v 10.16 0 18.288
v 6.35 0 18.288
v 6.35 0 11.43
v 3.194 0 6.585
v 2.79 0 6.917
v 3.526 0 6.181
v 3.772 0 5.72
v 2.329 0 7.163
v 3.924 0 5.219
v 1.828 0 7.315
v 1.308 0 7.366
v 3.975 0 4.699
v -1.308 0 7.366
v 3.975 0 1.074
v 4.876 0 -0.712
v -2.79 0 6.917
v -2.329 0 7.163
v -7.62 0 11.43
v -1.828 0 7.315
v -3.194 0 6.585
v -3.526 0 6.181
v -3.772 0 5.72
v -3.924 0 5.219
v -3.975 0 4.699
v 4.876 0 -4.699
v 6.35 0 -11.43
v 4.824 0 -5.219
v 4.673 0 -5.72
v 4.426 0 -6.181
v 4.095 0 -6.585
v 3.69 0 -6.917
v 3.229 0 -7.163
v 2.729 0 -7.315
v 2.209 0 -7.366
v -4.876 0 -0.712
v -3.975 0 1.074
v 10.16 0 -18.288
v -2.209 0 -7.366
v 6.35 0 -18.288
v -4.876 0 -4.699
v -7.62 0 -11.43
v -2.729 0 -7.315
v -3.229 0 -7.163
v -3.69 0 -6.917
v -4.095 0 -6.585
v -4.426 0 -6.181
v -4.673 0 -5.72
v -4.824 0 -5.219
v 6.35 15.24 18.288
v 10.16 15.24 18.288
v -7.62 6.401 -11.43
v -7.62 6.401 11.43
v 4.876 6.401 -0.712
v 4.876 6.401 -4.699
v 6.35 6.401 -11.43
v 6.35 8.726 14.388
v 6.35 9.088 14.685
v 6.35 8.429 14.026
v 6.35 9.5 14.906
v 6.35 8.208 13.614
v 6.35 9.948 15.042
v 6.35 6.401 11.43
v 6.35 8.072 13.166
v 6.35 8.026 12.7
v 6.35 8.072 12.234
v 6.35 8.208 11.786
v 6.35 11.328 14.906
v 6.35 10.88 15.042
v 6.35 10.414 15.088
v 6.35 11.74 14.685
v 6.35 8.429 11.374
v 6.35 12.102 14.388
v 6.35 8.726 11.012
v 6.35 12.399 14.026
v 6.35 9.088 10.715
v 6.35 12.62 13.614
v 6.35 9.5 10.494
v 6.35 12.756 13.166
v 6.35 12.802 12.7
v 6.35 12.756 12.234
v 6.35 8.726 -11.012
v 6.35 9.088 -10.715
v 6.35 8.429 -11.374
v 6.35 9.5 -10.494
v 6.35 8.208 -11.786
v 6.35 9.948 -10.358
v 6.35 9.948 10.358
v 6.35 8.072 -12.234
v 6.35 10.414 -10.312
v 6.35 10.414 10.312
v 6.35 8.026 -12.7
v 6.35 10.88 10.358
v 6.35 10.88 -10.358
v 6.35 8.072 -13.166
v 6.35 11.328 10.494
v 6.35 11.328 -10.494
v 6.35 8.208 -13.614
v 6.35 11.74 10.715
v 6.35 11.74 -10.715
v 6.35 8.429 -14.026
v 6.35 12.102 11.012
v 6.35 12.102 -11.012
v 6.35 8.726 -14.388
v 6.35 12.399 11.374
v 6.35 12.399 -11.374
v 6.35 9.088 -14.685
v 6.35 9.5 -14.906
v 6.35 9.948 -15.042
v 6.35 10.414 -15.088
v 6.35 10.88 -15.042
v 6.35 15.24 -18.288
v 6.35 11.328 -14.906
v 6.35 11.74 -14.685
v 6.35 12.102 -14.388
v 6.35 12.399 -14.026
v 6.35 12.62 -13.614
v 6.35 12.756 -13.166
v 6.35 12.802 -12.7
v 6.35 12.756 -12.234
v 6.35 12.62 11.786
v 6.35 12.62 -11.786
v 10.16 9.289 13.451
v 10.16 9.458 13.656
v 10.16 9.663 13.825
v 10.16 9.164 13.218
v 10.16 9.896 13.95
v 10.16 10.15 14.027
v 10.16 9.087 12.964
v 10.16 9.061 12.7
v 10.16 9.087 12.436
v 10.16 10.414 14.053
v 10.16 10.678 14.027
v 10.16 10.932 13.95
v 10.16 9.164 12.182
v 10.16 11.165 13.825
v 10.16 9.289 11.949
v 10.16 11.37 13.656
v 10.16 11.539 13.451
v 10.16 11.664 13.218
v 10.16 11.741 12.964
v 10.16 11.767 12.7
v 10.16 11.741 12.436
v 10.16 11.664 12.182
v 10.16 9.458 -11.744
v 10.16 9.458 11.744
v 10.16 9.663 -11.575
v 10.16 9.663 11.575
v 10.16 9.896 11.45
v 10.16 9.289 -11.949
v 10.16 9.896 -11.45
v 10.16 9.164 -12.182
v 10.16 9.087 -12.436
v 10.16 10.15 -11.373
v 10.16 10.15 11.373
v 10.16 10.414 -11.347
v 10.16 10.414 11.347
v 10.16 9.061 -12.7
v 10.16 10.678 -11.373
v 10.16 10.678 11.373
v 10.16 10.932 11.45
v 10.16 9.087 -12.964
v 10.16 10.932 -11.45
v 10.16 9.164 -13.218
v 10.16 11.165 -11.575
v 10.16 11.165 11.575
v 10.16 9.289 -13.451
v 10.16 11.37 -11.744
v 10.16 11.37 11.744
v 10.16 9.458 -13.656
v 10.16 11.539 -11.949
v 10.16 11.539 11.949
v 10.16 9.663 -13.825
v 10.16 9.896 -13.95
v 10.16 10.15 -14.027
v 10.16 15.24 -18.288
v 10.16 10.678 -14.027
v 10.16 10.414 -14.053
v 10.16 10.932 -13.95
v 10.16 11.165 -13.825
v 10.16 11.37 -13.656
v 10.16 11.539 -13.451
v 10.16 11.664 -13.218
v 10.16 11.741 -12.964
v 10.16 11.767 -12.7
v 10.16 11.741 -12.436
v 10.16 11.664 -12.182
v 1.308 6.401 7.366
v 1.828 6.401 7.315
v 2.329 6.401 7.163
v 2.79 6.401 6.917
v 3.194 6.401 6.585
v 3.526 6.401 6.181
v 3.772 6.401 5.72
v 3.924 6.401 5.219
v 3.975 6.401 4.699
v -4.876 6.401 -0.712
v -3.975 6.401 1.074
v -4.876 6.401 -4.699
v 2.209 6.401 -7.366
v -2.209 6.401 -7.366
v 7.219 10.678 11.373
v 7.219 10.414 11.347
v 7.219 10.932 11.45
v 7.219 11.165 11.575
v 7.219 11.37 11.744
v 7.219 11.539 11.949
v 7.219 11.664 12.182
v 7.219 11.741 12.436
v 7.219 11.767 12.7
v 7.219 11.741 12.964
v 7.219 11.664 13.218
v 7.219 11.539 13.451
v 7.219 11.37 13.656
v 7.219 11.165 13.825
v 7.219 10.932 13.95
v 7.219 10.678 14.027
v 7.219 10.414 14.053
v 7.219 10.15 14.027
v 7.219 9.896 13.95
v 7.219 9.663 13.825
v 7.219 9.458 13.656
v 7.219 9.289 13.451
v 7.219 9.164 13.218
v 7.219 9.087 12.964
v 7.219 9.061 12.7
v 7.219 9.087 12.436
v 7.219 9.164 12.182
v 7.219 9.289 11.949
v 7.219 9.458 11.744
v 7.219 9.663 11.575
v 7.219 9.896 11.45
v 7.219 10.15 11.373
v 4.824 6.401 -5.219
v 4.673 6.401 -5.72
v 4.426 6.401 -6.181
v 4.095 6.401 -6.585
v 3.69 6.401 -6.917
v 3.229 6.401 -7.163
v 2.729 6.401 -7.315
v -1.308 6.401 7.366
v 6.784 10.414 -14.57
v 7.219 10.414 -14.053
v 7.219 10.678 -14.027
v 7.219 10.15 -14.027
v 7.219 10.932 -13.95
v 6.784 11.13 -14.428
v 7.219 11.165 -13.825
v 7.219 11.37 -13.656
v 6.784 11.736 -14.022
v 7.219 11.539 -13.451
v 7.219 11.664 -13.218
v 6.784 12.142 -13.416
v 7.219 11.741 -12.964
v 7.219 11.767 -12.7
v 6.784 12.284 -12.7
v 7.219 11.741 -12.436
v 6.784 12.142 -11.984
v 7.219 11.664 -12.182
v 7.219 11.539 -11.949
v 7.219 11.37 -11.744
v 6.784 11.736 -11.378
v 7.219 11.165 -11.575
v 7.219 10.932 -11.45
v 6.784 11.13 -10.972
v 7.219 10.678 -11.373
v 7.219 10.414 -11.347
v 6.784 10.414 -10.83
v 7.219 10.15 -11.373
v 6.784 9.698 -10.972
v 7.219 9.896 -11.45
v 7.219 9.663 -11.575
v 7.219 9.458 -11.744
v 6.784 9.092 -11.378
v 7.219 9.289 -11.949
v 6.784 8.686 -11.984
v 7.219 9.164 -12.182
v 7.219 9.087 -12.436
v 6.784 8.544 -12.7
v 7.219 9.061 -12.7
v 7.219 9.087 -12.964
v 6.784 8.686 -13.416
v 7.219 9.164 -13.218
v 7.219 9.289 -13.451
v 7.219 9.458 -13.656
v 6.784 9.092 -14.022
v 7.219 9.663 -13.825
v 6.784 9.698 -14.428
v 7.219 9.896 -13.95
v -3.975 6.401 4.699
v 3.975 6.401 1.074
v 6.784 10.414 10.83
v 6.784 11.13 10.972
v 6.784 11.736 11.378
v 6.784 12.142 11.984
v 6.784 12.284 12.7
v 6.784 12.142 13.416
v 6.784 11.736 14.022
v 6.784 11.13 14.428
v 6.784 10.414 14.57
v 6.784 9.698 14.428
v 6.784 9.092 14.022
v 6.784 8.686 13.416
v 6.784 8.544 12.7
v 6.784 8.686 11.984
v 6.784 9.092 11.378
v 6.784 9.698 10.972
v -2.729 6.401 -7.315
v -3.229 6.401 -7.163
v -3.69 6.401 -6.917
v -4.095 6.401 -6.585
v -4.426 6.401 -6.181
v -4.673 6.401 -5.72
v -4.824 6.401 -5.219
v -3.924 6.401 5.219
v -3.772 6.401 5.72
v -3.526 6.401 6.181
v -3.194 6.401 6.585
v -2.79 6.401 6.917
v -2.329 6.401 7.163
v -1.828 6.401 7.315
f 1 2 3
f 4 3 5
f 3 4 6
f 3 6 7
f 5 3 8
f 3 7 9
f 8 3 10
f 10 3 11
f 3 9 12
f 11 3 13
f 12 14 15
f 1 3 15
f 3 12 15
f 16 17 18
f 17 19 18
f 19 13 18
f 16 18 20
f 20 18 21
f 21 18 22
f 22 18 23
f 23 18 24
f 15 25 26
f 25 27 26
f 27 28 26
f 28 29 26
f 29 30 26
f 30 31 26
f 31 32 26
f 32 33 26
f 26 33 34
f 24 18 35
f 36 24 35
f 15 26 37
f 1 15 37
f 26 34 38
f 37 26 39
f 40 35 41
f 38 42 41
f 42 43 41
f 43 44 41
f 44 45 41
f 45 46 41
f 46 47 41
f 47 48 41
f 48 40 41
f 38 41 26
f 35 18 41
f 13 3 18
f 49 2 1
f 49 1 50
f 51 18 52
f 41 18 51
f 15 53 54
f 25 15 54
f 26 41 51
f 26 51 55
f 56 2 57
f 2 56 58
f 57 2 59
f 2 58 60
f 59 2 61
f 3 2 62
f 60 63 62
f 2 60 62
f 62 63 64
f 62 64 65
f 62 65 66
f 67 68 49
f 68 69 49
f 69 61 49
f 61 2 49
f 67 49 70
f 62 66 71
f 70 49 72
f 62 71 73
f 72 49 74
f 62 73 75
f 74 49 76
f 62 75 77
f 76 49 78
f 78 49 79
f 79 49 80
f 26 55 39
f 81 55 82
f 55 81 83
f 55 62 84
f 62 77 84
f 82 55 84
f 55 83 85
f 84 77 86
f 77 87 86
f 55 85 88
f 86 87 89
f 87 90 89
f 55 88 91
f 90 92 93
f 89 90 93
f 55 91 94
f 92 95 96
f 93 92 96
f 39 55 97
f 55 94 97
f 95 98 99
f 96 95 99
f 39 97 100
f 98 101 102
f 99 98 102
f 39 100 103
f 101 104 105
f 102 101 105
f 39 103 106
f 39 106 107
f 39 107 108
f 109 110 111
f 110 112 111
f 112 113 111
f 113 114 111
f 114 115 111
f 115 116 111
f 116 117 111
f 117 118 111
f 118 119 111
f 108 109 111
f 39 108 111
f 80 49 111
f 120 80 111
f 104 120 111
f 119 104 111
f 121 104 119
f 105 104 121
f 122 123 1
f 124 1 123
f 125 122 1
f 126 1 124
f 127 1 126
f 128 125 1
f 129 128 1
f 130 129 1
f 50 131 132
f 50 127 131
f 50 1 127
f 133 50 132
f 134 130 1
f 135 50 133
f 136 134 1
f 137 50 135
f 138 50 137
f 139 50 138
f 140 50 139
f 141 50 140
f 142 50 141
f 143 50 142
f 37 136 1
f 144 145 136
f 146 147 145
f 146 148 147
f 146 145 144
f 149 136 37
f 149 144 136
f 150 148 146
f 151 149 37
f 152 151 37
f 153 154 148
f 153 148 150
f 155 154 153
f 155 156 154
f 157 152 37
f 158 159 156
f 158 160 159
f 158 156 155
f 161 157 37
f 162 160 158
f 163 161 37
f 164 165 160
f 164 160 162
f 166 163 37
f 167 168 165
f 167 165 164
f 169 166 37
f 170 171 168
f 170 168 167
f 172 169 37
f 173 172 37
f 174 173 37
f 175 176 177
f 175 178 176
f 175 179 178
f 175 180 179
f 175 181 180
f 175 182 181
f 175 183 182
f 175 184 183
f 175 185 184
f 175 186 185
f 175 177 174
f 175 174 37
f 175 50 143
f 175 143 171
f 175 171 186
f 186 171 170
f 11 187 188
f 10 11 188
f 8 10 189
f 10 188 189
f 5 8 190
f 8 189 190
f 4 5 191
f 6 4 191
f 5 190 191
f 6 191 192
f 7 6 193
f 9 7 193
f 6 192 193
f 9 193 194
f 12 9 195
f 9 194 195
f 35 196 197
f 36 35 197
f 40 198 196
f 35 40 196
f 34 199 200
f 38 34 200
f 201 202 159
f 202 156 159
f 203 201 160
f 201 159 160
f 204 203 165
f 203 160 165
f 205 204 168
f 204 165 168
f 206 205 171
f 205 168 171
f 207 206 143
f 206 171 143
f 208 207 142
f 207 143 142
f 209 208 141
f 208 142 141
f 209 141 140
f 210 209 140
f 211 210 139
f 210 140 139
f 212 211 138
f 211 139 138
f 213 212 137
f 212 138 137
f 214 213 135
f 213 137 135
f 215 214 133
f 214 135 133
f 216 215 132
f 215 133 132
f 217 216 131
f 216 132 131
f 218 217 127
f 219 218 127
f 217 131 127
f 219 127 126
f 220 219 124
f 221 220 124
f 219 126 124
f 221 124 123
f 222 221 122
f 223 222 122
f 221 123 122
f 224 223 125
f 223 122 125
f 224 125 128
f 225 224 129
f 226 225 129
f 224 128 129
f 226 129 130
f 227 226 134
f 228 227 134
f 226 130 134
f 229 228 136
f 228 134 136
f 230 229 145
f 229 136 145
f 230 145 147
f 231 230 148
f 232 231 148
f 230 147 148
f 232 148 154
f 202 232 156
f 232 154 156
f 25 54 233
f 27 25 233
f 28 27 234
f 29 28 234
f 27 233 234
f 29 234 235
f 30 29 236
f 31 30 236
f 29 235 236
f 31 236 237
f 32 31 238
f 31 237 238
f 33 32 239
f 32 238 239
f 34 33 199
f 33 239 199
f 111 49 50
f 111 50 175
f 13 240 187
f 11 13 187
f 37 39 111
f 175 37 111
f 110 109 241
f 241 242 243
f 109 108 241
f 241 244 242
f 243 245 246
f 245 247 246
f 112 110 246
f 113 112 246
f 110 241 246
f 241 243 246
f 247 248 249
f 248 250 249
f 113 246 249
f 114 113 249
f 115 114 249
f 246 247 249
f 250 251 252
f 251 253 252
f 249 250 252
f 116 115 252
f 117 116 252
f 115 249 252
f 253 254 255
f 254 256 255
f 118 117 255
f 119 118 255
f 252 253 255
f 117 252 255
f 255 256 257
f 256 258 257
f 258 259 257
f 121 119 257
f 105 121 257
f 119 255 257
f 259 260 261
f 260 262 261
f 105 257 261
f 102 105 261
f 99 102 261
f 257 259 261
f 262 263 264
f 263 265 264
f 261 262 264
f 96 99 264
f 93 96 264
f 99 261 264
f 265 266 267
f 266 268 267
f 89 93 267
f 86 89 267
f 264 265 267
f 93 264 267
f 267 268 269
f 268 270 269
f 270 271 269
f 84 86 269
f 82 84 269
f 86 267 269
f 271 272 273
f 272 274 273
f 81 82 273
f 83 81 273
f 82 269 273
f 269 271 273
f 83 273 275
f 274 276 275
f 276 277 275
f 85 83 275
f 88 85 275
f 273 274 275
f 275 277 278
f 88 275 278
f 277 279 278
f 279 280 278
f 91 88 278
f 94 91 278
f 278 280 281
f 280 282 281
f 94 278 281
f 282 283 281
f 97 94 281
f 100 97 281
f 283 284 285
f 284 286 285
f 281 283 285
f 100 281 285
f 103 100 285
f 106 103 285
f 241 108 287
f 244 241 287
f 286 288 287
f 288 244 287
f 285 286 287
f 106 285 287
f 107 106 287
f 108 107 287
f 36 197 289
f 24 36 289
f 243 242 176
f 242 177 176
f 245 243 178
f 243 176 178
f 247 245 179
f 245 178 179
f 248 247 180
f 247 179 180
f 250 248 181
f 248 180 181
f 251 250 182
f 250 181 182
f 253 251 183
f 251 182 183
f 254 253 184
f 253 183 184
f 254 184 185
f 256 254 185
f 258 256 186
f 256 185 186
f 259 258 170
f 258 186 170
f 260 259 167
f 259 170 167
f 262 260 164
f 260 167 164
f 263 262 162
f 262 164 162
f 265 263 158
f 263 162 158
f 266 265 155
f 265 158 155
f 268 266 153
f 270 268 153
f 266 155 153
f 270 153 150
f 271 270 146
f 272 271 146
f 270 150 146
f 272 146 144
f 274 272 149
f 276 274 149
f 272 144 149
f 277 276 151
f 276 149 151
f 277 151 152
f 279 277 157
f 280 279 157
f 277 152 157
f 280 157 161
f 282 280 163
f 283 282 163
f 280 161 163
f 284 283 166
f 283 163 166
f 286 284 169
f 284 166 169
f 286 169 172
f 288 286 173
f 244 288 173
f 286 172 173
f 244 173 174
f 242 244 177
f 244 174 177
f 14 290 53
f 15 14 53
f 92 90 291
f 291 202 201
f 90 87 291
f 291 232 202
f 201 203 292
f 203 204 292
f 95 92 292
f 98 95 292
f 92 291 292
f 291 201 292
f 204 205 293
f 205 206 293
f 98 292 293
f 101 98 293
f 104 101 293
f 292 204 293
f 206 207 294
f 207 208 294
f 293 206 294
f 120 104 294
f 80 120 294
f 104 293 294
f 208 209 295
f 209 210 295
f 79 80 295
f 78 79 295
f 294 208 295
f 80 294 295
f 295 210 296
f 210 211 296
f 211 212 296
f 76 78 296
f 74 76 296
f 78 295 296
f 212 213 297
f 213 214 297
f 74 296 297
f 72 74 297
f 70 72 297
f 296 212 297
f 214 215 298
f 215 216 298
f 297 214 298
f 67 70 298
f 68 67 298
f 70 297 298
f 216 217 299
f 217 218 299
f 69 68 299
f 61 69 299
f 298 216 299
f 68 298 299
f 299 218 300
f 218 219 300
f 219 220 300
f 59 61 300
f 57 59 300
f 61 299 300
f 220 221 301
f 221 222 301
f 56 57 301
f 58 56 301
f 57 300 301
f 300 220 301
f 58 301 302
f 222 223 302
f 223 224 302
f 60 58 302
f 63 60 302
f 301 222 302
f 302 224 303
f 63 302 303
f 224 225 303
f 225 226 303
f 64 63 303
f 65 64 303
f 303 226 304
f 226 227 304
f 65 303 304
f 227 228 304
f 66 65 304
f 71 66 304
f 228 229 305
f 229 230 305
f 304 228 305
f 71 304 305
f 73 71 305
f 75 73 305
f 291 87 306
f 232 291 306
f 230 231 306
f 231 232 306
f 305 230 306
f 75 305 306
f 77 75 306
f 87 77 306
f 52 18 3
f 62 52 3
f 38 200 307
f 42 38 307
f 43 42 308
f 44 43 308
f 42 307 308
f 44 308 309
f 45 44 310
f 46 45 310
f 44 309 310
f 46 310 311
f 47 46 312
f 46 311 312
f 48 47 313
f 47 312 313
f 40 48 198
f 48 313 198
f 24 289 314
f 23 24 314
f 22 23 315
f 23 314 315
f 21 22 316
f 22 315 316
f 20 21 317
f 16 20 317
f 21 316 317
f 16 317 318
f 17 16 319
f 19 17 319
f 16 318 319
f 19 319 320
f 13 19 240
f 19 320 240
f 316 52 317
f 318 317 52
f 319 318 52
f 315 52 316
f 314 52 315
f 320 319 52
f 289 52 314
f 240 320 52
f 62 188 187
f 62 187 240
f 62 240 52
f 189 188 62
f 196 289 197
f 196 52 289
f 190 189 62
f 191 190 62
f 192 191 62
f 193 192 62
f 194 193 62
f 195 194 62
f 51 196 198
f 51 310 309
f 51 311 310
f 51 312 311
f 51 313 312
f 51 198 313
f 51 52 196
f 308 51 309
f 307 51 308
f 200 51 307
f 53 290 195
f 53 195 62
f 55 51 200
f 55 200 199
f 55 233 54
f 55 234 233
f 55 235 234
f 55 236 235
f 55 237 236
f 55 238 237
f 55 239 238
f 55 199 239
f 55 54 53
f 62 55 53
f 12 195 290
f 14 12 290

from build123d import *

# Parameters (mm, degrees)
SKETCH1_W                       = 15.24
SKETCH1_H                       = 22.86
BOSS_EXTRUDE2_DEPTH             = 6.4008
CUT_EXTRUDE4_DEPTH              = 1
CUT_EXTRUDE4_DEPTH_BACK         = 7.4008
SKETCH7_W                       = 36.576
SKETCH7_H                       = 15.24
BOSS_EXTRUDE3_DEPTH             = 3.81
F_6_32_TAPPED_HOLE1_D           = 2.7051
F_6_32_TAPPED_HOLE1_CSINK_D     = 4.7752
F_6_32_TAPPED_HOLE1_CSINK_ANGLE = 100


with BuildPart() as part:
    # Sketch1 → Boss-Extrude2 (new body)
    with BuildSketch(Plane(origin=(0, 0, 0), x_dir=(1, 0, 0), z_dir=(0, 1, 0))):
        Rectangle(SKETCH1_W, SKETCH1_H)
        with BuildLine():
            Line((2.208651403, 6.604), (-2.208651403, 6.604))
            ThreePointArc((-2.208651403, 6.604), (-3.555689822, 6.046038418), (-4.113651403, 4.699))
            Line((-4.113651403, 4.699), (-4.113651403, 0.89281026))
            Line((-4.113651403, 0.89281026), (-3.2131, -0.89281026))
            Line((-3.2131, -0.89281026), (-3.2131, -4.699))
            ThreePointArc((-3.2131, -4.699), (-2.655138418, -6.046038418), (-1.3081, -6.604))
            Line((-1.3081, -6.604), (0, -6.604))
            Line((0, -6.604), (1.3081, -6.604))
            ThreePointArc((1.3081, -6.604), (2.655138418, -6.046038418), (3.2131, -4.699))
            Line((3.2131, -4.699), (3.2131, -0.89281026))
            Line((3.2131, -0.89281026), (4.113651403, 0.89281026))
            Line((4.113651403, 0.89281026), (4.113651403, 4.699))
            ThreePointArc((4.113651403, 4.699), (3.555689822, 6.046038418), (2.208651403, 6.604))
        make_face(mode=Mode.SUBTRACT)
    extrude(amount=BOSS_EXTRUDE2_DEPTH)

    # Sketch6 → Cut-Extrude4 (cut, two sides)
    with BuildSketch(Plane(origin=(0, 6.4008, 0), x_dir=(1, 0, 0), z_dir=(0, 1, 0))) as cut_extrude4_sk:
        with BuildLine():
            Line((-3.9751, -1.074087237), (-3.9751, -4.699))
            ThreePointArc((-3.9751, -4.699), (-3.193953785, -6.584853785), (-1.3081, -7.366))
            Line((-1.3081, -7.366), (1.3081, -7.366))
            ThreePointArc((1.3081, -7.366), (3.193953785, -6.584853785), (3.9751, -4.699))
            Line((3.9751, -4.699), (3.9751, -1.074087237))
            Line((3.9751, -1.074087237), (4.875651403, 0.711533282))
            Line((4.875651403, 0.711533282), (4.875651403, 4.699))
            ThreePointArc((4.875651403, 4.699), (4.094505189, 6.584853785), (2.208651403, 7.366))
            Line((2.208651403, 7.366), (-2.208651403, 7.366))
            ThreePointArc((-2.208651403, 7.366), (-4.094505189, 6.584853785), (-4.875651403, 4.699))
            Line((-4.875651403, 4.699), (-4.875651403, 0.711533282))
            Line((-4.875651403, 0.711533282), (-3.9751, -1.074087237))
        make_face()
    extrude(amount=CUT_EXTRUDE4_DEPTH, mode=Mode.SUBTRACT)
    extrude(cut_extrude4_sk.sketch, amount=-CUT_EXTRUDE4_DEPTH_BACK, mode=Mode.SUBTRACT)

    # Sketch7 → Boss-Extrude3 (add)
    with BuildSketch(Plane(origin=(6.35, 0, 0), x_dir=(0, 0, -1), z_dir=(1, 0, 0))):
        with Locations((0, 7.62)):
            Rectangle(SKETCH7_W, SKETCH7_H)
    extrude(amount=BOSS_EXTRUDE3_DEPTH)

    # #6-32 Tapped Hole1 (through all)
    with Locations(Plane.ZY.offset(-6.35)):
        with Locations((12.7, 10.414), (-12.7, 10.414)):
            CounterSinkHole(F_6_32_TAPPED_HOLE1_D / 2, F_6_32_TAPPED_HOLE1_CSINK_D / 2, counter_sink_angle=F_6_32_TAPPED_HOLE1_CSINK_ANGLE)


solid = part.part
